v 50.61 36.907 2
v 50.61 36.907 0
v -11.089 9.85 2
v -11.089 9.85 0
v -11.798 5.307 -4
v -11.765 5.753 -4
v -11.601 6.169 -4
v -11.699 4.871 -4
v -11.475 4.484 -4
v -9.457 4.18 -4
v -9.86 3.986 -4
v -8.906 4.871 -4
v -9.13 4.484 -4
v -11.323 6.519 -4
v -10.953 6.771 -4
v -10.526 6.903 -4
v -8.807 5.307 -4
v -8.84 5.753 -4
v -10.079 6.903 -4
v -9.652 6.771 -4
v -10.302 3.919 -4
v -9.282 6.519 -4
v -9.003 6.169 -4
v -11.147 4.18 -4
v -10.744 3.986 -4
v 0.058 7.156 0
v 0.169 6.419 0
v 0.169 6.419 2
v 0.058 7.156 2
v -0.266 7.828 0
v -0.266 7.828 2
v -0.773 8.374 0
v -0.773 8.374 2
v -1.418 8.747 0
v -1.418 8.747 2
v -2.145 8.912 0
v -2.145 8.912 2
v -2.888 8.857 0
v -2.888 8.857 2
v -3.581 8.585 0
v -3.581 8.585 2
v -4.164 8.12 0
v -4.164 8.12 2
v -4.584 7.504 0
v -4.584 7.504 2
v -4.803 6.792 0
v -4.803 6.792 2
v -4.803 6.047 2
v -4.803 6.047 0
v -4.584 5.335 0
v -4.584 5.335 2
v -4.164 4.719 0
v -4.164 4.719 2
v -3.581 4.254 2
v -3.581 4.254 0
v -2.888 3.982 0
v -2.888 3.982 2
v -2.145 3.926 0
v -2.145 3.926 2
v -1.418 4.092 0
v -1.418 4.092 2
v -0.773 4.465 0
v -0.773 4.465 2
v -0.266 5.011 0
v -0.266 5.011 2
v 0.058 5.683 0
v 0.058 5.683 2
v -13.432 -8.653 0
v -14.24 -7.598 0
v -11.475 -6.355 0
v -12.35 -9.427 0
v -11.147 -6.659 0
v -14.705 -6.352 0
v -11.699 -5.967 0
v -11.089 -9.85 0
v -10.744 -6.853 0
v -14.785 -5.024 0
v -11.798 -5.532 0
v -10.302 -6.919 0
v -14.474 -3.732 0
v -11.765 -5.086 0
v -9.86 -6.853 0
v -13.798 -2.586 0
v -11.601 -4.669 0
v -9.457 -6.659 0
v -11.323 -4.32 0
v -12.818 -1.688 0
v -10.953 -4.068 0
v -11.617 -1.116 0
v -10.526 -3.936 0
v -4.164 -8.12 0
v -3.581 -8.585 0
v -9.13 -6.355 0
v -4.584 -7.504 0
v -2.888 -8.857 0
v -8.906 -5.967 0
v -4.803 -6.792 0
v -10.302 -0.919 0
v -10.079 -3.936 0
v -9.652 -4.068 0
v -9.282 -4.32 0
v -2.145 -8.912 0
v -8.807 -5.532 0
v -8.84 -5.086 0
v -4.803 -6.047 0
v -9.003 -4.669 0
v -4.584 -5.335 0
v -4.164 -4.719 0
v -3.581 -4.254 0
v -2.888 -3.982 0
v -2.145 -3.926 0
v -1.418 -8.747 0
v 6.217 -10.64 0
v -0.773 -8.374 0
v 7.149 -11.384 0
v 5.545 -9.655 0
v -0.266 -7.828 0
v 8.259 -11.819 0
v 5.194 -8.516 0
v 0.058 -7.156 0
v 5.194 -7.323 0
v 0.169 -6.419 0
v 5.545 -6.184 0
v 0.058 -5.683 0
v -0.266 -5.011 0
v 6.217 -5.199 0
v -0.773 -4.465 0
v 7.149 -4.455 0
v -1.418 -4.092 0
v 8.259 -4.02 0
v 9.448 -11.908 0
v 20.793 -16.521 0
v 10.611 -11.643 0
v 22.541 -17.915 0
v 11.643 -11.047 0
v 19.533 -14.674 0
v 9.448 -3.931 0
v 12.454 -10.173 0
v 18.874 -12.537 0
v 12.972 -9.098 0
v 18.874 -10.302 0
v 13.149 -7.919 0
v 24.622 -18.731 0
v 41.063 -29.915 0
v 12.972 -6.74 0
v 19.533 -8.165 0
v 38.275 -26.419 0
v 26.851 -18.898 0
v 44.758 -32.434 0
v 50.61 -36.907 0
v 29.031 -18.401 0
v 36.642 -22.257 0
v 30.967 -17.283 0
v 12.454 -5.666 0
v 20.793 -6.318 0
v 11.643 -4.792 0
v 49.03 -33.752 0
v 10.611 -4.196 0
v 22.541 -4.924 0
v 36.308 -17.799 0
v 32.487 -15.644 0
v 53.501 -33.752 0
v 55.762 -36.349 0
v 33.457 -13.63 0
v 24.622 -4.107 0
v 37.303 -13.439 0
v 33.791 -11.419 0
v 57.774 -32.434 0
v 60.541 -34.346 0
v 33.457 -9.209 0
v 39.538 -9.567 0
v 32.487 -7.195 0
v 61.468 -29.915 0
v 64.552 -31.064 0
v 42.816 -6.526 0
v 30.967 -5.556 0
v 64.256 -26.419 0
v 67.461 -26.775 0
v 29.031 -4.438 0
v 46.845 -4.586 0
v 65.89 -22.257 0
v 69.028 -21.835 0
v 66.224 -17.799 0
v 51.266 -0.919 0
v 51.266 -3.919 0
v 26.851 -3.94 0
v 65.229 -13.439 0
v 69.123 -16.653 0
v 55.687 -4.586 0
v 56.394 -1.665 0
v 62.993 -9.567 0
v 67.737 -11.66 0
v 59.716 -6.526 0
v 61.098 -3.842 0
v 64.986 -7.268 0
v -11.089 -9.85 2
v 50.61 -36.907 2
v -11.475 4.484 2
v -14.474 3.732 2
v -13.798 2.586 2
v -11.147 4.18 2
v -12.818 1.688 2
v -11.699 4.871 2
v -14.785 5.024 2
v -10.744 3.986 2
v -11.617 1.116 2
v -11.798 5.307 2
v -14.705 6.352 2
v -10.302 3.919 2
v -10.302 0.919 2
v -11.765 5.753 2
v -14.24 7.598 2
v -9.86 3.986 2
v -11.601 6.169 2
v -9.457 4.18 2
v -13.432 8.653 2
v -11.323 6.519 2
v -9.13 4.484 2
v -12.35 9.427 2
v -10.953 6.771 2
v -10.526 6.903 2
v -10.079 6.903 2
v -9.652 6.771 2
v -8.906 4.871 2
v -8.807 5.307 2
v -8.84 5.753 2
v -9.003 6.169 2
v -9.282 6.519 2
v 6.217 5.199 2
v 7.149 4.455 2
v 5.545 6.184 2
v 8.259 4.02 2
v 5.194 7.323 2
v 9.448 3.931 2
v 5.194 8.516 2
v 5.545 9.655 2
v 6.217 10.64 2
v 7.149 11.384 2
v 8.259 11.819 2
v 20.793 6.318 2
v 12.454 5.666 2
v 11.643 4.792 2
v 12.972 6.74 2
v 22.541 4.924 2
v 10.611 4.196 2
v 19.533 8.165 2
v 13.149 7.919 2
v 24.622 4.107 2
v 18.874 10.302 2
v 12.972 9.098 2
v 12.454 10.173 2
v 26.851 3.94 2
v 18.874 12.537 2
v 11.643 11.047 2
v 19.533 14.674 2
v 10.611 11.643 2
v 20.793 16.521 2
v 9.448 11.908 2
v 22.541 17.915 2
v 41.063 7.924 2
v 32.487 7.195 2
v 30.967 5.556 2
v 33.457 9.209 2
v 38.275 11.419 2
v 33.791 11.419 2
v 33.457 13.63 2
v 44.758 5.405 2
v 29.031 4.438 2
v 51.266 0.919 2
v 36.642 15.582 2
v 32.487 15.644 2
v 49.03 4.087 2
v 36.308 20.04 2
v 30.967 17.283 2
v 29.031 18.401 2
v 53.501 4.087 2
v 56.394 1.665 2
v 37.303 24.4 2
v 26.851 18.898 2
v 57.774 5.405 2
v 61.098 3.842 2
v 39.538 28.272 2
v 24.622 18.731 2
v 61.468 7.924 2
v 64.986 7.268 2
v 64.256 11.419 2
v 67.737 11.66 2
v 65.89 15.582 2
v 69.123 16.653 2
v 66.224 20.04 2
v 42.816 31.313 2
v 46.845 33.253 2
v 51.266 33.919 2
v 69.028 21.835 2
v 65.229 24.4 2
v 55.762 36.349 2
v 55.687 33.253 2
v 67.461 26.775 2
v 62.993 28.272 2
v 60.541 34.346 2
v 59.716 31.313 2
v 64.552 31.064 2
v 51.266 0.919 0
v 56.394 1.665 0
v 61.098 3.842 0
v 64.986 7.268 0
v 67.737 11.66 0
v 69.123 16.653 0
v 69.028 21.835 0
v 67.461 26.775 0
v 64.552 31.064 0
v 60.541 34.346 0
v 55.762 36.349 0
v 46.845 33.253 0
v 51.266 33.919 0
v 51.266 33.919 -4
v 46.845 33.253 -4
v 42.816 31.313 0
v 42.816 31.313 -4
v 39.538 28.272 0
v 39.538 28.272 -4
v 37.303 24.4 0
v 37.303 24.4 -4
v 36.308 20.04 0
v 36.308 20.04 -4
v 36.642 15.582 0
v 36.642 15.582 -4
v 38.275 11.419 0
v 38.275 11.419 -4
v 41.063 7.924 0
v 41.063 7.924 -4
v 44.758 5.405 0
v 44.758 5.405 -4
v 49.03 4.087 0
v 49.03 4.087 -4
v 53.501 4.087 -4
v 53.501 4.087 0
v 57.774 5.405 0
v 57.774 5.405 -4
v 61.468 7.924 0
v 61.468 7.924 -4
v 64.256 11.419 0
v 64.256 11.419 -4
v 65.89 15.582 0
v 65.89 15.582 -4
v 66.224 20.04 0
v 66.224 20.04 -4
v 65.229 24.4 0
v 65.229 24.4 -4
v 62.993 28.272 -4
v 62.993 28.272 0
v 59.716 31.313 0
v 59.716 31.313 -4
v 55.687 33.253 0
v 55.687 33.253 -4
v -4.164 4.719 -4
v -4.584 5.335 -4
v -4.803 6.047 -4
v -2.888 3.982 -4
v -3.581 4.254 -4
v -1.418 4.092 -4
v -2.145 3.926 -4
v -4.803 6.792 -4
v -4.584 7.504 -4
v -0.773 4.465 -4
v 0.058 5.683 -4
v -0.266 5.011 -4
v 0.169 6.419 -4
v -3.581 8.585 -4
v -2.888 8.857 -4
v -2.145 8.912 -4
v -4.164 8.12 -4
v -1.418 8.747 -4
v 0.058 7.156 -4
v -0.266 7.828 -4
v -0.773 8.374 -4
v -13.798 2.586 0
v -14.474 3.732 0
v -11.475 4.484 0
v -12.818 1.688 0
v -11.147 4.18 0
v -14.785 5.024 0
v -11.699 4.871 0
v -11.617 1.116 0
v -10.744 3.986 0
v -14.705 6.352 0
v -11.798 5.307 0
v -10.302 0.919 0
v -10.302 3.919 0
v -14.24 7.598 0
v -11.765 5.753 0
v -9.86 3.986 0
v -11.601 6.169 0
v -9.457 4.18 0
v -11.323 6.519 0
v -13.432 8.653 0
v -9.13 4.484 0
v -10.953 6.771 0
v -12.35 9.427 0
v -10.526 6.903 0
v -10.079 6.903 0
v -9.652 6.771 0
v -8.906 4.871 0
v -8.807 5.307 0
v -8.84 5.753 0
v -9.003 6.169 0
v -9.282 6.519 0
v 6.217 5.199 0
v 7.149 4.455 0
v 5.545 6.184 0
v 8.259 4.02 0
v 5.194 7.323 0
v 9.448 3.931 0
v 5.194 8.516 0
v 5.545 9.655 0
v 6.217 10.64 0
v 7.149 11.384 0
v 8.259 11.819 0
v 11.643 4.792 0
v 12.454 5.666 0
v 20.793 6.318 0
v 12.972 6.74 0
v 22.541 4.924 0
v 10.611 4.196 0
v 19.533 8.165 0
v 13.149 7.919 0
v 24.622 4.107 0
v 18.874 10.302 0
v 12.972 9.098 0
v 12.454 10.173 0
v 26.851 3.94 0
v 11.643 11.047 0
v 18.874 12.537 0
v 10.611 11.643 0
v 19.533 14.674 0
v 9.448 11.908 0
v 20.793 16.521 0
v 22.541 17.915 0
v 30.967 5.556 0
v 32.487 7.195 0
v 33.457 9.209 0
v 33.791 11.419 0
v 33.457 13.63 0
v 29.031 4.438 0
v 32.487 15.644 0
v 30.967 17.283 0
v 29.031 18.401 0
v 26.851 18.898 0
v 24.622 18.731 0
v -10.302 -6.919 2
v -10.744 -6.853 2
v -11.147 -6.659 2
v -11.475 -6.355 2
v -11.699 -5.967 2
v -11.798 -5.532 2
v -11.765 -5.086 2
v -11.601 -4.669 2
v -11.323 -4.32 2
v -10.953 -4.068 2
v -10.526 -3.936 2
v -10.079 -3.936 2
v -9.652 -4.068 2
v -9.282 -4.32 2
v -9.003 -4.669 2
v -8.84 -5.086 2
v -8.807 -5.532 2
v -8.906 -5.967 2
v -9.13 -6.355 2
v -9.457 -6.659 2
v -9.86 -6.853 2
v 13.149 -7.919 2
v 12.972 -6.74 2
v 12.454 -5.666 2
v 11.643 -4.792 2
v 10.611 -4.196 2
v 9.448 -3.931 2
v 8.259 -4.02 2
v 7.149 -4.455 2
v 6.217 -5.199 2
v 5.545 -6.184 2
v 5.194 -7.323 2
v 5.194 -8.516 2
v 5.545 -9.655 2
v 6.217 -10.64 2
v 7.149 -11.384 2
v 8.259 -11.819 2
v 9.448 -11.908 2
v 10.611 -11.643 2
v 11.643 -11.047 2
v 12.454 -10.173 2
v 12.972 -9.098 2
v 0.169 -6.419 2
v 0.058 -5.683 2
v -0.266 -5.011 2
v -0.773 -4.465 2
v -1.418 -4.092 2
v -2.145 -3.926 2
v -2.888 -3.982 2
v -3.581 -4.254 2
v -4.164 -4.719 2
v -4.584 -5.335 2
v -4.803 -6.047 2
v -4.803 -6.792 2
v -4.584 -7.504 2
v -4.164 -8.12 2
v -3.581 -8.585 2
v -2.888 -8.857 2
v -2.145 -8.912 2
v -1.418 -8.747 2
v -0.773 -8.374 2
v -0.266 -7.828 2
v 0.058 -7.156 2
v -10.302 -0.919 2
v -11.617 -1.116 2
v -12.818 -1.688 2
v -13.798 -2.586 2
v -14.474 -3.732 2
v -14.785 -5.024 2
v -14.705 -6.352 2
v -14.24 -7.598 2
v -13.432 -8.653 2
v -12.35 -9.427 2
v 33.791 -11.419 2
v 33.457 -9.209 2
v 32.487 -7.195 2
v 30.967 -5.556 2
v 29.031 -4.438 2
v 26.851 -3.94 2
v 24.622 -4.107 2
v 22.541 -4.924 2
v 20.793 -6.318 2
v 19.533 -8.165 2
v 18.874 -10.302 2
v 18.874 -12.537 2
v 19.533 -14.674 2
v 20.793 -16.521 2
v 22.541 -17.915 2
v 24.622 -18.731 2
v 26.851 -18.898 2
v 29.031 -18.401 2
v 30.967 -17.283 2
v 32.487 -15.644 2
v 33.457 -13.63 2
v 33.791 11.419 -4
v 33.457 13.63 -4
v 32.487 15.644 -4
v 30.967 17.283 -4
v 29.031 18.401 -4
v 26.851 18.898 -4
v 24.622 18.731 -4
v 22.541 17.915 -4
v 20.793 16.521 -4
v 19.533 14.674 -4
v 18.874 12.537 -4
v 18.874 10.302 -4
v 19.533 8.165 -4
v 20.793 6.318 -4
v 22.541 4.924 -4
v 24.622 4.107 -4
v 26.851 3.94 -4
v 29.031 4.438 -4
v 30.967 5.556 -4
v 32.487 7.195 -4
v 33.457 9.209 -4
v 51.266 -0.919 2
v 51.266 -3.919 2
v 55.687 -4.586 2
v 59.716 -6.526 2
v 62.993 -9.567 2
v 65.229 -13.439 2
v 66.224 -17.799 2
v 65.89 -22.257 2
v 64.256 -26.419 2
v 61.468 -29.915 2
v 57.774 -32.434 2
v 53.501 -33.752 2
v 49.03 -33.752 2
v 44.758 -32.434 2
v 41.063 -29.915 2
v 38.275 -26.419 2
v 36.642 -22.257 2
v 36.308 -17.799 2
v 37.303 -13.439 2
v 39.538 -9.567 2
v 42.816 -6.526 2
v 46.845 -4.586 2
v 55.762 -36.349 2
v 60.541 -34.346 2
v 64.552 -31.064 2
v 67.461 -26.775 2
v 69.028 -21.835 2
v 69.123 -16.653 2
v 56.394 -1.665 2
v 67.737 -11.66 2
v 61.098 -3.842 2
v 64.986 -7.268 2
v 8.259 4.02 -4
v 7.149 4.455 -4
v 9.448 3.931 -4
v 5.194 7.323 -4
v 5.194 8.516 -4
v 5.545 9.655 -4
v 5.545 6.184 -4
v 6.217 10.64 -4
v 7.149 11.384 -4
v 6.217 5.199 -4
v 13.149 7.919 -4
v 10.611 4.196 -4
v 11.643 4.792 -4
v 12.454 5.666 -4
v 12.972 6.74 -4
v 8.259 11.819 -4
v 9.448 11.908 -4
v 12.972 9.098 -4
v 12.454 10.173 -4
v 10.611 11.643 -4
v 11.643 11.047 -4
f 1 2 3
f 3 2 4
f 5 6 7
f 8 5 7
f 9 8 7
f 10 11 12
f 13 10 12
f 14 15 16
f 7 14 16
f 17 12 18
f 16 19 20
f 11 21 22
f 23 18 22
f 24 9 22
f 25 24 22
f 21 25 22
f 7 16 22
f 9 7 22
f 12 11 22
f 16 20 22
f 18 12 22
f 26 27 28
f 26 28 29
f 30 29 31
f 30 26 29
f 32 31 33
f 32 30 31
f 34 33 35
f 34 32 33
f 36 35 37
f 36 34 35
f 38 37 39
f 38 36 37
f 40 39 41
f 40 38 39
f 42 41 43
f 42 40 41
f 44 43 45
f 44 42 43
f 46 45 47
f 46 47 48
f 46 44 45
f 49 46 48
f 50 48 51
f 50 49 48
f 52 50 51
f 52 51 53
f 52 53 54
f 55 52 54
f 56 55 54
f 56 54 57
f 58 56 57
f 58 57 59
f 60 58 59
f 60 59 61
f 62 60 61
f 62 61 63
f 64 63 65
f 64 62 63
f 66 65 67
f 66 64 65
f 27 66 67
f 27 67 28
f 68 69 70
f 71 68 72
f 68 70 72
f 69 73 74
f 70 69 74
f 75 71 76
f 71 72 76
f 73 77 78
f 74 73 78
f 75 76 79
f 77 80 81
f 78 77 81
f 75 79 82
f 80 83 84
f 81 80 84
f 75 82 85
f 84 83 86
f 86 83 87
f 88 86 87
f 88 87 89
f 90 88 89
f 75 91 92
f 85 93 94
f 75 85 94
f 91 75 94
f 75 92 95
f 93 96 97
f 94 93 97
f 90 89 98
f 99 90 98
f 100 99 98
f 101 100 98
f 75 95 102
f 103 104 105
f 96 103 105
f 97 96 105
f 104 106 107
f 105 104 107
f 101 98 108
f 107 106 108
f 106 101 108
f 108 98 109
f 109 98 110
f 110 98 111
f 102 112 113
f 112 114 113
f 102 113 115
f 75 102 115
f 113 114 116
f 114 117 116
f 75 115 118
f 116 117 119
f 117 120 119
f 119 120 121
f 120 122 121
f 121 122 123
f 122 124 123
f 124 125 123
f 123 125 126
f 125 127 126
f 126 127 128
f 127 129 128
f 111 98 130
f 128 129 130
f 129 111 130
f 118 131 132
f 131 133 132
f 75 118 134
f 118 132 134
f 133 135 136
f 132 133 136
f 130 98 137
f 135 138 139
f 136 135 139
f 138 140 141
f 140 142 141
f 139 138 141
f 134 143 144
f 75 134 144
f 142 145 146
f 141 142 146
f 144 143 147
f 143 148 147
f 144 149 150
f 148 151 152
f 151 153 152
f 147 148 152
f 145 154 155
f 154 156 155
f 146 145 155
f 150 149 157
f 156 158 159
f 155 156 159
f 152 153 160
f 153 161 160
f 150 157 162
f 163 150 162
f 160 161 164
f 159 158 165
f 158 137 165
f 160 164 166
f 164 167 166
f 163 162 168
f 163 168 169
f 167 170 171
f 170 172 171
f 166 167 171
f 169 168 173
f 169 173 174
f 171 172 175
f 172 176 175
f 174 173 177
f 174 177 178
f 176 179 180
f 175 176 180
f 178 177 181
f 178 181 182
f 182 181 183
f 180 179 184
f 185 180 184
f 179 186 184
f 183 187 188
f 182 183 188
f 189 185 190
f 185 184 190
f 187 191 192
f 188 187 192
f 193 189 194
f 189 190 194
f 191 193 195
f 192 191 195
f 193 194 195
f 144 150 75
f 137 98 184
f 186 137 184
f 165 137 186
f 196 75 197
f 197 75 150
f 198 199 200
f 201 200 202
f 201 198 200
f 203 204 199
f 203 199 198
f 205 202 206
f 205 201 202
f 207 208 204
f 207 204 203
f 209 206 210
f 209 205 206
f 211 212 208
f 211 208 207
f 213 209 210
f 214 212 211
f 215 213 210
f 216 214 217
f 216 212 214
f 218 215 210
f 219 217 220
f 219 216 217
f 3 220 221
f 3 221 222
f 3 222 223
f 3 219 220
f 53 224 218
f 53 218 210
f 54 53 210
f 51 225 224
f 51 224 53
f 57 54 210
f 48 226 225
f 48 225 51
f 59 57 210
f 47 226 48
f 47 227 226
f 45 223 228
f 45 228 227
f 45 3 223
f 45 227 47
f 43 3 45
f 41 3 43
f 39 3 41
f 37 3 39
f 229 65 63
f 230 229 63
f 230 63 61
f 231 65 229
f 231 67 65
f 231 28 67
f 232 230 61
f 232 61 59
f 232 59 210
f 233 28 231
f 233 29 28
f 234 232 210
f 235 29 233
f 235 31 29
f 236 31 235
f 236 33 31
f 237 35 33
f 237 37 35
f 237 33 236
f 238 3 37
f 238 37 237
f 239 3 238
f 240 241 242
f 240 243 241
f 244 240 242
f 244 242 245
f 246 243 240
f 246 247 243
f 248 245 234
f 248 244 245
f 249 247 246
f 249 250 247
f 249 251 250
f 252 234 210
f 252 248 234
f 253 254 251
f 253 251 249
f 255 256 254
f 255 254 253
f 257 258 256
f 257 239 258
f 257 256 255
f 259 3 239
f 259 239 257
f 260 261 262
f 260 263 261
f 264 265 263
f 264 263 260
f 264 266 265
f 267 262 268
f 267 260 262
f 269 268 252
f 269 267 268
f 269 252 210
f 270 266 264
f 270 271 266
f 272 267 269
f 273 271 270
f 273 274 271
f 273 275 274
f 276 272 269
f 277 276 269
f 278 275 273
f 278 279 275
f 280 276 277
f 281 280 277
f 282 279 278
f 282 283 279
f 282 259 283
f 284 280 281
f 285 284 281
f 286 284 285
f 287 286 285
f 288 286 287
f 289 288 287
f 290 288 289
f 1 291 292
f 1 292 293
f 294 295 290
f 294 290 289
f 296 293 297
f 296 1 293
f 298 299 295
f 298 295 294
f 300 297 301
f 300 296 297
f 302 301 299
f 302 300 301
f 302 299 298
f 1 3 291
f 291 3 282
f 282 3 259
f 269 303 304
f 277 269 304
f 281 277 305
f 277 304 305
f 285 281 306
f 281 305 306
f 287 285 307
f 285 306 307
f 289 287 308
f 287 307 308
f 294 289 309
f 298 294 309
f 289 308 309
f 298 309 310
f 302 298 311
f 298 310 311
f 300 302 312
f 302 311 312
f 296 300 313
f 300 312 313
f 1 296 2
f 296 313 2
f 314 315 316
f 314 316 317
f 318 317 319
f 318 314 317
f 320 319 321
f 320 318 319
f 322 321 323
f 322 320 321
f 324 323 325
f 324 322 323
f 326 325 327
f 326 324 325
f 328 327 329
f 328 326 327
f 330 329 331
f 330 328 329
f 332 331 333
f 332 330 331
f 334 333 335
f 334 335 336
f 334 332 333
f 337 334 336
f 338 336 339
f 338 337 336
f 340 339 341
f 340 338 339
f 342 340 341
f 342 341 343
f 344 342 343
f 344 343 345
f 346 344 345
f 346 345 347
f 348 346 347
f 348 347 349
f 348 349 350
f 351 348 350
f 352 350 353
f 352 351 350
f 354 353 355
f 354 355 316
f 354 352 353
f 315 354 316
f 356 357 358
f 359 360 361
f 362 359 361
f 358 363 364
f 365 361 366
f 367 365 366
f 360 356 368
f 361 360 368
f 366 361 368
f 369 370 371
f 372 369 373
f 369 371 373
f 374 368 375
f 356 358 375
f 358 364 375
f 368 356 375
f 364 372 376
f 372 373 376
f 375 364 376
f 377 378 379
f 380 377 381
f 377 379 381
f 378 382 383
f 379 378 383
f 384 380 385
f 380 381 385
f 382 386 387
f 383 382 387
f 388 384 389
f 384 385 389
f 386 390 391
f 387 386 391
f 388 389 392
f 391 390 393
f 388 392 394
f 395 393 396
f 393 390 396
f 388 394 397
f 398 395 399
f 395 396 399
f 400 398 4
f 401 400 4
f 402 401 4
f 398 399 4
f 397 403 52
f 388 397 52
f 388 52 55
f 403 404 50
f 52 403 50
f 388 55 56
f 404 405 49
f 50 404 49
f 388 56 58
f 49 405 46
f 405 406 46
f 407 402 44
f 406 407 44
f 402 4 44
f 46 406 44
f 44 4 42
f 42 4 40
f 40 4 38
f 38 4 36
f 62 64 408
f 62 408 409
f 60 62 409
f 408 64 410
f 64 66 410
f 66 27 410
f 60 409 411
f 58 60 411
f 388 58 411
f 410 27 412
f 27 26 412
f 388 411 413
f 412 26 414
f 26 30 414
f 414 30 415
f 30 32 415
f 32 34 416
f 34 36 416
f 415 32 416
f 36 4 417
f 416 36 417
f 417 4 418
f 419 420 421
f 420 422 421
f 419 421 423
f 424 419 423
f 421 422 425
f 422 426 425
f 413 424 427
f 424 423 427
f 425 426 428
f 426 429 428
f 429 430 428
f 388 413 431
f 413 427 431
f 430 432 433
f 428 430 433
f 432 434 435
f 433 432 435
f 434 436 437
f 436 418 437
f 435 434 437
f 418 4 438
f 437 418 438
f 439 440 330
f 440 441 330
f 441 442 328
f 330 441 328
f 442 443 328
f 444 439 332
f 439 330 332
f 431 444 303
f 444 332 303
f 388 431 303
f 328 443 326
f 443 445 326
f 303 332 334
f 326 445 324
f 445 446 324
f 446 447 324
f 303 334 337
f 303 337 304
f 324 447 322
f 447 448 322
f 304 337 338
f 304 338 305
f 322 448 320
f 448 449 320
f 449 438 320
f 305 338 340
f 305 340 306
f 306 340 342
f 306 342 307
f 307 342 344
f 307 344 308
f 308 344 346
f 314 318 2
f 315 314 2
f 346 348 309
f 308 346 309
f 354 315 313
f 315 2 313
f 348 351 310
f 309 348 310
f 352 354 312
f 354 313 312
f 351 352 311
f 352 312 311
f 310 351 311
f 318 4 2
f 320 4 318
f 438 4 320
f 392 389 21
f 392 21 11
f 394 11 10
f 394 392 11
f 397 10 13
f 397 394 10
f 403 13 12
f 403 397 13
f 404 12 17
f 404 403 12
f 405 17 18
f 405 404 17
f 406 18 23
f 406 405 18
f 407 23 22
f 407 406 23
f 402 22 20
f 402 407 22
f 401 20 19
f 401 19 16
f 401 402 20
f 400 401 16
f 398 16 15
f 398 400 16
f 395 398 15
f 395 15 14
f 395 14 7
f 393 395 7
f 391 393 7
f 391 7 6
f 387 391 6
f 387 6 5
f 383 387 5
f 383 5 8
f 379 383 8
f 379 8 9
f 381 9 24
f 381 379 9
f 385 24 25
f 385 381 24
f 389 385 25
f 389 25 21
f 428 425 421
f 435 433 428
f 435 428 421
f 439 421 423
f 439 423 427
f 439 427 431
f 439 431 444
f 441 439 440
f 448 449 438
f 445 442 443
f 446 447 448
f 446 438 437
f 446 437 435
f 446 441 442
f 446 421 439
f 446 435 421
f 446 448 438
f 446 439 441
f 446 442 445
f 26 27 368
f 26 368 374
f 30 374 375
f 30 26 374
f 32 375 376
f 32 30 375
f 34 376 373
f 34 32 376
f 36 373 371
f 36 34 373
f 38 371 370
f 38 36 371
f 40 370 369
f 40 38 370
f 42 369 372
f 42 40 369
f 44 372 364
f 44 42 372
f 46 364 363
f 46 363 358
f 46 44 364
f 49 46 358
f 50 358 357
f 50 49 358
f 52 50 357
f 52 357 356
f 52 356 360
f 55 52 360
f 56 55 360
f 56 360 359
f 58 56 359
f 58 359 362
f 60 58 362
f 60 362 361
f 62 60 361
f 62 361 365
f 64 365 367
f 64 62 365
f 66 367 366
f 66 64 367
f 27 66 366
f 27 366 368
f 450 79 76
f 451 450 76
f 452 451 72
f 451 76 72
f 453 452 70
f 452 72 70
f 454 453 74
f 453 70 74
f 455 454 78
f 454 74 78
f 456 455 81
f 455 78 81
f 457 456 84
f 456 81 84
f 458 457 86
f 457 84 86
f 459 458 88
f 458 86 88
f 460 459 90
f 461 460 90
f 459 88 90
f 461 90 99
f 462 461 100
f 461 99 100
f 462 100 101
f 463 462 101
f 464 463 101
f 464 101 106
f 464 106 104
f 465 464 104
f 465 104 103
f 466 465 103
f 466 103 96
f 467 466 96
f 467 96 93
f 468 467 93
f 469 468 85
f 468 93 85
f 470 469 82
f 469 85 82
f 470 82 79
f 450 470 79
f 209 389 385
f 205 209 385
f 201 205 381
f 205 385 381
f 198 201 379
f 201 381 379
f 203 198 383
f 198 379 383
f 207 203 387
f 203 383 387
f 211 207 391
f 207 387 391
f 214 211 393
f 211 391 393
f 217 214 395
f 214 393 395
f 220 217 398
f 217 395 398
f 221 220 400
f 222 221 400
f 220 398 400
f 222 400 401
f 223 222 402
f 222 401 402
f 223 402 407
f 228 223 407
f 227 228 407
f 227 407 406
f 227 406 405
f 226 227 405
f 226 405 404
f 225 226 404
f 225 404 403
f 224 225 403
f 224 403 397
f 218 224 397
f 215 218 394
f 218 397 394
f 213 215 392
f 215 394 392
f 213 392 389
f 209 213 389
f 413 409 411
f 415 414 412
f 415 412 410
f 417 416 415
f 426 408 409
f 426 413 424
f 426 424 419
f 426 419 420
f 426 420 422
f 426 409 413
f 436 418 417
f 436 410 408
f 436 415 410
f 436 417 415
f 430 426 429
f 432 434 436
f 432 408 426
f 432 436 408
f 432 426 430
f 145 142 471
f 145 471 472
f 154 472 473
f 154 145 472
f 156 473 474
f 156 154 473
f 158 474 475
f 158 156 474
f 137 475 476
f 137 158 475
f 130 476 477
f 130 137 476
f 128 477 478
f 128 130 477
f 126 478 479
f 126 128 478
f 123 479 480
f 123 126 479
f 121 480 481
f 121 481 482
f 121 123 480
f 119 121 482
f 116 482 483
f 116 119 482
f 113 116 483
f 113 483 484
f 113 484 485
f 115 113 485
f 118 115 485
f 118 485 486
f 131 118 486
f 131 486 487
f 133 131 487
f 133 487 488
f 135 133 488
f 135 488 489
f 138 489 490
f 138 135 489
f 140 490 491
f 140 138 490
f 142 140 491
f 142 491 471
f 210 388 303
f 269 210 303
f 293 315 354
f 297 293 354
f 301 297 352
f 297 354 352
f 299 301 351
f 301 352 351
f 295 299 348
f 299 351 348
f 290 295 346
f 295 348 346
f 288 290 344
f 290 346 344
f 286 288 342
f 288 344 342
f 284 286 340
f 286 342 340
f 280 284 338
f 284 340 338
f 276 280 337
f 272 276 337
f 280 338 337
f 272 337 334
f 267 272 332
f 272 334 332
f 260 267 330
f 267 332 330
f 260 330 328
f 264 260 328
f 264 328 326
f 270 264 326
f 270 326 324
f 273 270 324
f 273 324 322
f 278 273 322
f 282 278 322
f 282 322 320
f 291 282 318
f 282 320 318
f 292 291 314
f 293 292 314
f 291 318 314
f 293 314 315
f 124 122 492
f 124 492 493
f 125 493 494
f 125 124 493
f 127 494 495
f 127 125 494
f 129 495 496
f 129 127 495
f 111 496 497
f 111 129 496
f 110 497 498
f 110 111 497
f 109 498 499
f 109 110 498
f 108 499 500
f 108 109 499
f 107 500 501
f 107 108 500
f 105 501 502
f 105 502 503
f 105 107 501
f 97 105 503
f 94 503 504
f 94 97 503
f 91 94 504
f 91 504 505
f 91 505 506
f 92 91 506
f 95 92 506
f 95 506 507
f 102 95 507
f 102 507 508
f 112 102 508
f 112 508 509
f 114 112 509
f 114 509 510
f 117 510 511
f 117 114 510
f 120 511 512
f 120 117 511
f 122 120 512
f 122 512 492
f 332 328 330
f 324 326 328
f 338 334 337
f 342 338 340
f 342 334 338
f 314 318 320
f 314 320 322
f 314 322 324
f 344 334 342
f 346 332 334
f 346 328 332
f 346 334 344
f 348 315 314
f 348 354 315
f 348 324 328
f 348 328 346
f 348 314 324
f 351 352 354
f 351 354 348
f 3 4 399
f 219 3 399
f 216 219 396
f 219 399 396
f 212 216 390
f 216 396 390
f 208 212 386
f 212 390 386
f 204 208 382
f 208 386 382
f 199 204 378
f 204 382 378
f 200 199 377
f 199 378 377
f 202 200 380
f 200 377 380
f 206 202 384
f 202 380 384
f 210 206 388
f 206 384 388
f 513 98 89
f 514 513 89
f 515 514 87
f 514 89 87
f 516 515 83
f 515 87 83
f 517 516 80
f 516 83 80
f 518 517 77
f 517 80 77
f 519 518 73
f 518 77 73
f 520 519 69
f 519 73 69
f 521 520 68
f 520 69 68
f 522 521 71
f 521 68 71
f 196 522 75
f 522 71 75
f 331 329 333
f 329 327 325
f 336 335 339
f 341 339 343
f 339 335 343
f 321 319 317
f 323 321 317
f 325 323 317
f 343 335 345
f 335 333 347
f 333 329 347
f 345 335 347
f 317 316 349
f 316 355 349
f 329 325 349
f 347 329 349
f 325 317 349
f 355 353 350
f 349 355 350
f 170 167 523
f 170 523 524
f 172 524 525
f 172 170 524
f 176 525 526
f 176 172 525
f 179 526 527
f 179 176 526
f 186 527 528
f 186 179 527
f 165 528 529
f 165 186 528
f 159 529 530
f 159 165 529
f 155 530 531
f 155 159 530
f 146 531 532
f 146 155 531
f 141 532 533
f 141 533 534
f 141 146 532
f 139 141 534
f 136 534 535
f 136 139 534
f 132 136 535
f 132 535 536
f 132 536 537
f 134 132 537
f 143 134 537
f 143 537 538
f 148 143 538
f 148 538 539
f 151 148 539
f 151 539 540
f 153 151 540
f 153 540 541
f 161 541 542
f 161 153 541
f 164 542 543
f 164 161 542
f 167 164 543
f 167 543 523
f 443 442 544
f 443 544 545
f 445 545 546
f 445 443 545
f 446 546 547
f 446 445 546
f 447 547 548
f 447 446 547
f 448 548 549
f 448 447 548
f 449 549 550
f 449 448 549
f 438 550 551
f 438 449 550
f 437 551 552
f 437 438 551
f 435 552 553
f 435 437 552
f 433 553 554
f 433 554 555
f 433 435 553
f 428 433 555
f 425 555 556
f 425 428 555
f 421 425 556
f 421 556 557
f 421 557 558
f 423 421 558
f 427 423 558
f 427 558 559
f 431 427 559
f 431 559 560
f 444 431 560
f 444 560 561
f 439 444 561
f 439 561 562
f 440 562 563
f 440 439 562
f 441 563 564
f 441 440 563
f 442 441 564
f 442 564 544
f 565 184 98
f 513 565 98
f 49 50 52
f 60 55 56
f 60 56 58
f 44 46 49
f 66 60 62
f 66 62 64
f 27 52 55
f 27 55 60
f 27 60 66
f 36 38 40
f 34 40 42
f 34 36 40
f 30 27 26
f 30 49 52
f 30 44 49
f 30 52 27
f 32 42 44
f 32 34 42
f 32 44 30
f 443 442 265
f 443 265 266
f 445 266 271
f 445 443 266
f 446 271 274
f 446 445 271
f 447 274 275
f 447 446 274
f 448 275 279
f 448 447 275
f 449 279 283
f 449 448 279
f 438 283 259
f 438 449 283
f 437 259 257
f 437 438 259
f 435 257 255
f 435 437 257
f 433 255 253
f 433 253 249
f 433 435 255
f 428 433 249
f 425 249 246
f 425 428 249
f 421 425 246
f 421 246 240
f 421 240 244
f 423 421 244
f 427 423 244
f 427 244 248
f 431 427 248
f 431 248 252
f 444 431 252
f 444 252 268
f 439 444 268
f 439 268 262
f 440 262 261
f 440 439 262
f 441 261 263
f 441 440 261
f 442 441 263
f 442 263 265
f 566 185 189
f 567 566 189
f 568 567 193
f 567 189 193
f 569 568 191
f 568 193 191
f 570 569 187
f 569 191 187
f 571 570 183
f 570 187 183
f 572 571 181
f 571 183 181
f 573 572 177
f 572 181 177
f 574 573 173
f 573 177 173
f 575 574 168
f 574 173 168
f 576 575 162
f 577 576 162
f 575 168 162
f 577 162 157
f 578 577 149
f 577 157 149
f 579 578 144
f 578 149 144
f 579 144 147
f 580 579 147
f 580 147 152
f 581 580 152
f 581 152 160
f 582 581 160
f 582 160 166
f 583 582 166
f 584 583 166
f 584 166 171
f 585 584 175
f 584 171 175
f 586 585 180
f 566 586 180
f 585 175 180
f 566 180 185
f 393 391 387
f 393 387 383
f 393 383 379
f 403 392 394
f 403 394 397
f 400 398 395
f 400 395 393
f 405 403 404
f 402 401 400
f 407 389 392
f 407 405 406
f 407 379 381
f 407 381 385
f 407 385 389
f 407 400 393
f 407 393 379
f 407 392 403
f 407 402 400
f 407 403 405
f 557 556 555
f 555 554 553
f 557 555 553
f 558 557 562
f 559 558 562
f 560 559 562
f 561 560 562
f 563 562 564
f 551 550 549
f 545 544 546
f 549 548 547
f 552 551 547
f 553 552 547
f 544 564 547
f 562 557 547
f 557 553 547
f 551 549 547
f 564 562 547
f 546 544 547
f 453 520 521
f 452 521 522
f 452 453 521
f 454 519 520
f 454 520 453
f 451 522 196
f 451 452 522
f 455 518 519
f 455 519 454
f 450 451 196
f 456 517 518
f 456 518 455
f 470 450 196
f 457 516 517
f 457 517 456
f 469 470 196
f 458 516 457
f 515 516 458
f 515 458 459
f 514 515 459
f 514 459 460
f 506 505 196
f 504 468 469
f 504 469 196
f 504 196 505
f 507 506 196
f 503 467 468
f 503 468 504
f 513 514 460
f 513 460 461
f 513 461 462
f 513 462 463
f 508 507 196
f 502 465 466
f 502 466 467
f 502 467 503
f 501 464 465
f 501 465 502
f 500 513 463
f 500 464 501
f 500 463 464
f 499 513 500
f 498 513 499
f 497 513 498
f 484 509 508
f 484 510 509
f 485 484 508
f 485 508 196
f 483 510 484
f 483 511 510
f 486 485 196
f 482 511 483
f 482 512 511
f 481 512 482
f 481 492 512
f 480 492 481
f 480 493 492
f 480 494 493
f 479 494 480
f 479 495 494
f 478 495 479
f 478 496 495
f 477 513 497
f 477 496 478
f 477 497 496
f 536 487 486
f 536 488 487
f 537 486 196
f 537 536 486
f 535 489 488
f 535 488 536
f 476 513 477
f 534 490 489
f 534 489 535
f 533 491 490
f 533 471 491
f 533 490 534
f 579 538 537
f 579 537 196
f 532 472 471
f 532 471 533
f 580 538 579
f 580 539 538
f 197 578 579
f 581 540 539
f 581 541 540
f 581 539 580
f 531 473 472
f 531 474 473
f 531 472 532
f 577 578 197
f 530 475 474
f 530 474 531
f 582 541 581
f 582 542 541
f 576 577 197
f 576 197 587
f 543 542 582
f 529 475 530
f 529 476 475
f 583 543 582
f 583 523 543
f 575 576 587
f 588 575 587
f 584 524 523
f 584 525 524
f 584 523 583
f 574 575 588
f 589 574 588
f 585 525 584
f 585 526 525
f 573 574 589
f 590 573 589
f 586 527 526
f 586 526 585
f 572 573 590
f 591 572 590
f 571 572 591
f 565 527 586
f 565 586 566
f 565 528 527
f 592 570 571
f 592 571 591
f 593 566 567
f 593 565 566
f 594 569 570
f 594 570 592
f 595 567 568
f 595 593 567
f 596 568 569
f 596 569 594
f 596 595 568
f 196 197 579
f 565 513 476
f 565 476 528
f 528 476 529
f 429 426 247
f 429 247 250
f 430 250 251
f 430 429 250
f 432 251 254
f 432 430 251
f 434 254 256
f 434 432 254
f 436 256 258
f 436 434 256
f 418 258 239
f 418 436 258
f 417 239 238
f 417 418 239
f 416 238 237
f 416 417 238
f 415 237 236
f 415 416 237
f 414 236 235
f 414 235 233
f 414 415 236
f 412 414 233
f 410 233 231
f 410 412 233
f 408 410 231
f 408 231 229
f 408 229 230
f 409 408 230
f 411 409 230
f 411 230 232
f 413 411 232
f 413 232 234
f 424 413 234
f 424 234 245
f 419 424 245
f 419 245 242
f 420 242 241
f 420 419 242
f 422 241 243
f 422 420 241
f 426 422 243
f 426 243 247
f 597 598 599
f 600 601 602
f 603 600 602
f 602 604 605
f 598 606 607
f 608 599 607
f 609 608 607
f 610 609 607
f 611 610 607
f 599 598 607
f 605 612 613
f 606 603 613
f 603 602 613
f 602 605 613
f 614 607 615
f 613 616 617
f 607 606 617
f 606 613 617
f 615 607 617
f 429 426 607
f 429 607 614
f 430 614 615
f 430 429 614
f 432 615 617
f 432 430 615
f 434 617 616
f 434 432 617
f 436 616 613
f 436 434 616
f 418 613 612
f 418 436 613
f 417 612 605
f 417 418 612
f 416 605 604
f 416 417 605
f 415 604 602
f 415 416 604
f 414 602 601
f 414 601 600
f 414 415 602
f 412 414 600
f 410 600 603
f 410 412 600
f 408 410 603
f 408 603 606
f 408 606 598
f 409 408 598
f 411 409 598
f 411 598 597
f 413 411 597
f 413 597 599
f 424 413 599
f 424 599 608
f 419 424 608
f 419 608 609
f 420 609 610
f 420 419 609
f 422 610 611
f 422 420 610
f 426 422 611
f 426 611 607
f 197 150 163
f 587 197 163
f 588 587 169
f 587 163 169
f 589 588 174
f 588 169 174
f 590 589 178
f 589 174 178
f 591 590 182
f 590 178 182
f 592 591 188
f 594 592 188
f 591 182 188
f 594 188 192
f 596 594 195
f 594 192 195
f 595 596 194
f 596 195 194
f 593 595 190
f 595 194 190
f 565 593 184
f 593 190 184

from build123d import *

# Parameters (mm, degrees)
F0_R     = 2.5
F0_R_2   = 7.5
F0_R_3   = 4
F1_DEPTH = 2
F2_DEPTH = 4


with BuildPart() as f1:
    # F0 (on Top) → F1 (new body)
    with BuildSketch(Plane.XY):
        with BuildLine():
            ThreePointArc((-10.302346, -0.919454), (-14.784971, -5.02439), (-11.089423, -9.850087))
            Line((-11.089423, -9.850087), (50.60965, -36.907489))
            ThreePointArc((50.60965, -36.907489), (69.262841, -19.247599), (51.265832, -0.919454))
            Line((51.265832, -0.919454), (-10.302346, -0.919454))
        make_face()
        with BuildLine():
            ThreePointArc((-10.302346, -3.919454), (-8.802346, -5.419454), (-10.302346, -6.919454))
            ThreePointArc((-10.302346, -6.919454), (-11.802346, -5.419454), (-10.302346, -3.919454))
        make_face(mode=Mode.SUBTRACT)
        with Locations((-2.331417, -6.419454)):
            Circle(F0_R, mode=Mode.SUBTRACT)
        with Locations((26.290541, -11.419454)):
            Circle(F0_R_2, mode=Mode.SUBTRACT)
        with Locations((9.14936, -7.919454)):
            Circle(F0_R_3, mode=Mode.SUBTRACT)
        with BuildLine():
            ThreePointArc((51.265832, -33.919454), (36.265832, -18.919454), (51.265832, -3.919454))
            ThreePointArc((51.265832, -3.919454), (66.265832, -18.919454), (51.265832, -33.919454))
        make_face(mode=Mode.SUBTRACT)
        with BuildLine():
            Line((-10.302346, 0.919454), (51.265832, 0.919454))
            ThreePointArc((51.265832, 0.919454), (69.262841, 19.247599), (50.60965, 36.907489))
            Line((50.60965, 36.907489), (-11.089423, 9.850087))
            ThreePointArc((-11.089423, 9.850087), (-14.784971, 5.02439), (-10.302346, 0.919454))
        make_face()
        with BuildLine():
            ThreePointArc((-10.302346, 6.919454), (-8.802346, 5.419454), (-10.302346, 3.919454))
            ThreePointArc((-10.302346, 3.919454), (-11.802346, 5.419454), (-10.302346, 6.919454))
        make_face(mode=Mode.SUBTRACT)
        with Locations((-2.331417, 6.419454)):
            Circle(F0_R, mode=Mode.SUBTRACT)
        with Locations((9.14936, 7.919454)):
            Circle(F0_R_3, mode=Mode.SUBTRACT)
        with Locations((26.290541, 11.419454)):
            Circle(F0_R_2, mode=Mode.SUBTRACT)
        with BuildLine():
            ThreePointArc((51.265832, 3.919454), (36.265832, 18.919454), (51.265832, 33.919454))
            ThreePointArc((51.265832, 33.919454), (66.265832, 18.919454), (51.265832, 3.919454))
        make_face(mode=Mode.SUBTRACT)
    extrude(amount=F1_DEPTH)


with BuildPart() as f2:
    # F0 (on Top) → F2 (new body)
    with BuildSketch(Plane.XY):
        with BuildLine():
            ThreePointArc((51.265832, 3.919454), (66.265832, 18.919454), (51.265832, 33.919454))
            ThreePointArc((51.265832, 33.919454), (36.265832, 18.919454), (51.265832, 3.919454))
        make_face()
        with Locations((26.290541, 11.419454)):
            Circle(F0_R_2)
        with Locations((9.14936, 7.919454)):
            Circle(F0_R_3)
        with Locations((-2.331417, 6.419454)):
            Circle(F0_R)
        with BuildLine():
            ThreePointArc((-10.302346, 6.919454), (-11.802346, 5.419454), (-10.302346, 3.919454))
            ThreePointArc((-10.302346, 3.919454), (-8.802346, 5.419454), (-10.302346, 6.919454))
        make_face()
    extrude(amount=-F2_DEPTH)


solid = Compound([f1.part, f2.part])
